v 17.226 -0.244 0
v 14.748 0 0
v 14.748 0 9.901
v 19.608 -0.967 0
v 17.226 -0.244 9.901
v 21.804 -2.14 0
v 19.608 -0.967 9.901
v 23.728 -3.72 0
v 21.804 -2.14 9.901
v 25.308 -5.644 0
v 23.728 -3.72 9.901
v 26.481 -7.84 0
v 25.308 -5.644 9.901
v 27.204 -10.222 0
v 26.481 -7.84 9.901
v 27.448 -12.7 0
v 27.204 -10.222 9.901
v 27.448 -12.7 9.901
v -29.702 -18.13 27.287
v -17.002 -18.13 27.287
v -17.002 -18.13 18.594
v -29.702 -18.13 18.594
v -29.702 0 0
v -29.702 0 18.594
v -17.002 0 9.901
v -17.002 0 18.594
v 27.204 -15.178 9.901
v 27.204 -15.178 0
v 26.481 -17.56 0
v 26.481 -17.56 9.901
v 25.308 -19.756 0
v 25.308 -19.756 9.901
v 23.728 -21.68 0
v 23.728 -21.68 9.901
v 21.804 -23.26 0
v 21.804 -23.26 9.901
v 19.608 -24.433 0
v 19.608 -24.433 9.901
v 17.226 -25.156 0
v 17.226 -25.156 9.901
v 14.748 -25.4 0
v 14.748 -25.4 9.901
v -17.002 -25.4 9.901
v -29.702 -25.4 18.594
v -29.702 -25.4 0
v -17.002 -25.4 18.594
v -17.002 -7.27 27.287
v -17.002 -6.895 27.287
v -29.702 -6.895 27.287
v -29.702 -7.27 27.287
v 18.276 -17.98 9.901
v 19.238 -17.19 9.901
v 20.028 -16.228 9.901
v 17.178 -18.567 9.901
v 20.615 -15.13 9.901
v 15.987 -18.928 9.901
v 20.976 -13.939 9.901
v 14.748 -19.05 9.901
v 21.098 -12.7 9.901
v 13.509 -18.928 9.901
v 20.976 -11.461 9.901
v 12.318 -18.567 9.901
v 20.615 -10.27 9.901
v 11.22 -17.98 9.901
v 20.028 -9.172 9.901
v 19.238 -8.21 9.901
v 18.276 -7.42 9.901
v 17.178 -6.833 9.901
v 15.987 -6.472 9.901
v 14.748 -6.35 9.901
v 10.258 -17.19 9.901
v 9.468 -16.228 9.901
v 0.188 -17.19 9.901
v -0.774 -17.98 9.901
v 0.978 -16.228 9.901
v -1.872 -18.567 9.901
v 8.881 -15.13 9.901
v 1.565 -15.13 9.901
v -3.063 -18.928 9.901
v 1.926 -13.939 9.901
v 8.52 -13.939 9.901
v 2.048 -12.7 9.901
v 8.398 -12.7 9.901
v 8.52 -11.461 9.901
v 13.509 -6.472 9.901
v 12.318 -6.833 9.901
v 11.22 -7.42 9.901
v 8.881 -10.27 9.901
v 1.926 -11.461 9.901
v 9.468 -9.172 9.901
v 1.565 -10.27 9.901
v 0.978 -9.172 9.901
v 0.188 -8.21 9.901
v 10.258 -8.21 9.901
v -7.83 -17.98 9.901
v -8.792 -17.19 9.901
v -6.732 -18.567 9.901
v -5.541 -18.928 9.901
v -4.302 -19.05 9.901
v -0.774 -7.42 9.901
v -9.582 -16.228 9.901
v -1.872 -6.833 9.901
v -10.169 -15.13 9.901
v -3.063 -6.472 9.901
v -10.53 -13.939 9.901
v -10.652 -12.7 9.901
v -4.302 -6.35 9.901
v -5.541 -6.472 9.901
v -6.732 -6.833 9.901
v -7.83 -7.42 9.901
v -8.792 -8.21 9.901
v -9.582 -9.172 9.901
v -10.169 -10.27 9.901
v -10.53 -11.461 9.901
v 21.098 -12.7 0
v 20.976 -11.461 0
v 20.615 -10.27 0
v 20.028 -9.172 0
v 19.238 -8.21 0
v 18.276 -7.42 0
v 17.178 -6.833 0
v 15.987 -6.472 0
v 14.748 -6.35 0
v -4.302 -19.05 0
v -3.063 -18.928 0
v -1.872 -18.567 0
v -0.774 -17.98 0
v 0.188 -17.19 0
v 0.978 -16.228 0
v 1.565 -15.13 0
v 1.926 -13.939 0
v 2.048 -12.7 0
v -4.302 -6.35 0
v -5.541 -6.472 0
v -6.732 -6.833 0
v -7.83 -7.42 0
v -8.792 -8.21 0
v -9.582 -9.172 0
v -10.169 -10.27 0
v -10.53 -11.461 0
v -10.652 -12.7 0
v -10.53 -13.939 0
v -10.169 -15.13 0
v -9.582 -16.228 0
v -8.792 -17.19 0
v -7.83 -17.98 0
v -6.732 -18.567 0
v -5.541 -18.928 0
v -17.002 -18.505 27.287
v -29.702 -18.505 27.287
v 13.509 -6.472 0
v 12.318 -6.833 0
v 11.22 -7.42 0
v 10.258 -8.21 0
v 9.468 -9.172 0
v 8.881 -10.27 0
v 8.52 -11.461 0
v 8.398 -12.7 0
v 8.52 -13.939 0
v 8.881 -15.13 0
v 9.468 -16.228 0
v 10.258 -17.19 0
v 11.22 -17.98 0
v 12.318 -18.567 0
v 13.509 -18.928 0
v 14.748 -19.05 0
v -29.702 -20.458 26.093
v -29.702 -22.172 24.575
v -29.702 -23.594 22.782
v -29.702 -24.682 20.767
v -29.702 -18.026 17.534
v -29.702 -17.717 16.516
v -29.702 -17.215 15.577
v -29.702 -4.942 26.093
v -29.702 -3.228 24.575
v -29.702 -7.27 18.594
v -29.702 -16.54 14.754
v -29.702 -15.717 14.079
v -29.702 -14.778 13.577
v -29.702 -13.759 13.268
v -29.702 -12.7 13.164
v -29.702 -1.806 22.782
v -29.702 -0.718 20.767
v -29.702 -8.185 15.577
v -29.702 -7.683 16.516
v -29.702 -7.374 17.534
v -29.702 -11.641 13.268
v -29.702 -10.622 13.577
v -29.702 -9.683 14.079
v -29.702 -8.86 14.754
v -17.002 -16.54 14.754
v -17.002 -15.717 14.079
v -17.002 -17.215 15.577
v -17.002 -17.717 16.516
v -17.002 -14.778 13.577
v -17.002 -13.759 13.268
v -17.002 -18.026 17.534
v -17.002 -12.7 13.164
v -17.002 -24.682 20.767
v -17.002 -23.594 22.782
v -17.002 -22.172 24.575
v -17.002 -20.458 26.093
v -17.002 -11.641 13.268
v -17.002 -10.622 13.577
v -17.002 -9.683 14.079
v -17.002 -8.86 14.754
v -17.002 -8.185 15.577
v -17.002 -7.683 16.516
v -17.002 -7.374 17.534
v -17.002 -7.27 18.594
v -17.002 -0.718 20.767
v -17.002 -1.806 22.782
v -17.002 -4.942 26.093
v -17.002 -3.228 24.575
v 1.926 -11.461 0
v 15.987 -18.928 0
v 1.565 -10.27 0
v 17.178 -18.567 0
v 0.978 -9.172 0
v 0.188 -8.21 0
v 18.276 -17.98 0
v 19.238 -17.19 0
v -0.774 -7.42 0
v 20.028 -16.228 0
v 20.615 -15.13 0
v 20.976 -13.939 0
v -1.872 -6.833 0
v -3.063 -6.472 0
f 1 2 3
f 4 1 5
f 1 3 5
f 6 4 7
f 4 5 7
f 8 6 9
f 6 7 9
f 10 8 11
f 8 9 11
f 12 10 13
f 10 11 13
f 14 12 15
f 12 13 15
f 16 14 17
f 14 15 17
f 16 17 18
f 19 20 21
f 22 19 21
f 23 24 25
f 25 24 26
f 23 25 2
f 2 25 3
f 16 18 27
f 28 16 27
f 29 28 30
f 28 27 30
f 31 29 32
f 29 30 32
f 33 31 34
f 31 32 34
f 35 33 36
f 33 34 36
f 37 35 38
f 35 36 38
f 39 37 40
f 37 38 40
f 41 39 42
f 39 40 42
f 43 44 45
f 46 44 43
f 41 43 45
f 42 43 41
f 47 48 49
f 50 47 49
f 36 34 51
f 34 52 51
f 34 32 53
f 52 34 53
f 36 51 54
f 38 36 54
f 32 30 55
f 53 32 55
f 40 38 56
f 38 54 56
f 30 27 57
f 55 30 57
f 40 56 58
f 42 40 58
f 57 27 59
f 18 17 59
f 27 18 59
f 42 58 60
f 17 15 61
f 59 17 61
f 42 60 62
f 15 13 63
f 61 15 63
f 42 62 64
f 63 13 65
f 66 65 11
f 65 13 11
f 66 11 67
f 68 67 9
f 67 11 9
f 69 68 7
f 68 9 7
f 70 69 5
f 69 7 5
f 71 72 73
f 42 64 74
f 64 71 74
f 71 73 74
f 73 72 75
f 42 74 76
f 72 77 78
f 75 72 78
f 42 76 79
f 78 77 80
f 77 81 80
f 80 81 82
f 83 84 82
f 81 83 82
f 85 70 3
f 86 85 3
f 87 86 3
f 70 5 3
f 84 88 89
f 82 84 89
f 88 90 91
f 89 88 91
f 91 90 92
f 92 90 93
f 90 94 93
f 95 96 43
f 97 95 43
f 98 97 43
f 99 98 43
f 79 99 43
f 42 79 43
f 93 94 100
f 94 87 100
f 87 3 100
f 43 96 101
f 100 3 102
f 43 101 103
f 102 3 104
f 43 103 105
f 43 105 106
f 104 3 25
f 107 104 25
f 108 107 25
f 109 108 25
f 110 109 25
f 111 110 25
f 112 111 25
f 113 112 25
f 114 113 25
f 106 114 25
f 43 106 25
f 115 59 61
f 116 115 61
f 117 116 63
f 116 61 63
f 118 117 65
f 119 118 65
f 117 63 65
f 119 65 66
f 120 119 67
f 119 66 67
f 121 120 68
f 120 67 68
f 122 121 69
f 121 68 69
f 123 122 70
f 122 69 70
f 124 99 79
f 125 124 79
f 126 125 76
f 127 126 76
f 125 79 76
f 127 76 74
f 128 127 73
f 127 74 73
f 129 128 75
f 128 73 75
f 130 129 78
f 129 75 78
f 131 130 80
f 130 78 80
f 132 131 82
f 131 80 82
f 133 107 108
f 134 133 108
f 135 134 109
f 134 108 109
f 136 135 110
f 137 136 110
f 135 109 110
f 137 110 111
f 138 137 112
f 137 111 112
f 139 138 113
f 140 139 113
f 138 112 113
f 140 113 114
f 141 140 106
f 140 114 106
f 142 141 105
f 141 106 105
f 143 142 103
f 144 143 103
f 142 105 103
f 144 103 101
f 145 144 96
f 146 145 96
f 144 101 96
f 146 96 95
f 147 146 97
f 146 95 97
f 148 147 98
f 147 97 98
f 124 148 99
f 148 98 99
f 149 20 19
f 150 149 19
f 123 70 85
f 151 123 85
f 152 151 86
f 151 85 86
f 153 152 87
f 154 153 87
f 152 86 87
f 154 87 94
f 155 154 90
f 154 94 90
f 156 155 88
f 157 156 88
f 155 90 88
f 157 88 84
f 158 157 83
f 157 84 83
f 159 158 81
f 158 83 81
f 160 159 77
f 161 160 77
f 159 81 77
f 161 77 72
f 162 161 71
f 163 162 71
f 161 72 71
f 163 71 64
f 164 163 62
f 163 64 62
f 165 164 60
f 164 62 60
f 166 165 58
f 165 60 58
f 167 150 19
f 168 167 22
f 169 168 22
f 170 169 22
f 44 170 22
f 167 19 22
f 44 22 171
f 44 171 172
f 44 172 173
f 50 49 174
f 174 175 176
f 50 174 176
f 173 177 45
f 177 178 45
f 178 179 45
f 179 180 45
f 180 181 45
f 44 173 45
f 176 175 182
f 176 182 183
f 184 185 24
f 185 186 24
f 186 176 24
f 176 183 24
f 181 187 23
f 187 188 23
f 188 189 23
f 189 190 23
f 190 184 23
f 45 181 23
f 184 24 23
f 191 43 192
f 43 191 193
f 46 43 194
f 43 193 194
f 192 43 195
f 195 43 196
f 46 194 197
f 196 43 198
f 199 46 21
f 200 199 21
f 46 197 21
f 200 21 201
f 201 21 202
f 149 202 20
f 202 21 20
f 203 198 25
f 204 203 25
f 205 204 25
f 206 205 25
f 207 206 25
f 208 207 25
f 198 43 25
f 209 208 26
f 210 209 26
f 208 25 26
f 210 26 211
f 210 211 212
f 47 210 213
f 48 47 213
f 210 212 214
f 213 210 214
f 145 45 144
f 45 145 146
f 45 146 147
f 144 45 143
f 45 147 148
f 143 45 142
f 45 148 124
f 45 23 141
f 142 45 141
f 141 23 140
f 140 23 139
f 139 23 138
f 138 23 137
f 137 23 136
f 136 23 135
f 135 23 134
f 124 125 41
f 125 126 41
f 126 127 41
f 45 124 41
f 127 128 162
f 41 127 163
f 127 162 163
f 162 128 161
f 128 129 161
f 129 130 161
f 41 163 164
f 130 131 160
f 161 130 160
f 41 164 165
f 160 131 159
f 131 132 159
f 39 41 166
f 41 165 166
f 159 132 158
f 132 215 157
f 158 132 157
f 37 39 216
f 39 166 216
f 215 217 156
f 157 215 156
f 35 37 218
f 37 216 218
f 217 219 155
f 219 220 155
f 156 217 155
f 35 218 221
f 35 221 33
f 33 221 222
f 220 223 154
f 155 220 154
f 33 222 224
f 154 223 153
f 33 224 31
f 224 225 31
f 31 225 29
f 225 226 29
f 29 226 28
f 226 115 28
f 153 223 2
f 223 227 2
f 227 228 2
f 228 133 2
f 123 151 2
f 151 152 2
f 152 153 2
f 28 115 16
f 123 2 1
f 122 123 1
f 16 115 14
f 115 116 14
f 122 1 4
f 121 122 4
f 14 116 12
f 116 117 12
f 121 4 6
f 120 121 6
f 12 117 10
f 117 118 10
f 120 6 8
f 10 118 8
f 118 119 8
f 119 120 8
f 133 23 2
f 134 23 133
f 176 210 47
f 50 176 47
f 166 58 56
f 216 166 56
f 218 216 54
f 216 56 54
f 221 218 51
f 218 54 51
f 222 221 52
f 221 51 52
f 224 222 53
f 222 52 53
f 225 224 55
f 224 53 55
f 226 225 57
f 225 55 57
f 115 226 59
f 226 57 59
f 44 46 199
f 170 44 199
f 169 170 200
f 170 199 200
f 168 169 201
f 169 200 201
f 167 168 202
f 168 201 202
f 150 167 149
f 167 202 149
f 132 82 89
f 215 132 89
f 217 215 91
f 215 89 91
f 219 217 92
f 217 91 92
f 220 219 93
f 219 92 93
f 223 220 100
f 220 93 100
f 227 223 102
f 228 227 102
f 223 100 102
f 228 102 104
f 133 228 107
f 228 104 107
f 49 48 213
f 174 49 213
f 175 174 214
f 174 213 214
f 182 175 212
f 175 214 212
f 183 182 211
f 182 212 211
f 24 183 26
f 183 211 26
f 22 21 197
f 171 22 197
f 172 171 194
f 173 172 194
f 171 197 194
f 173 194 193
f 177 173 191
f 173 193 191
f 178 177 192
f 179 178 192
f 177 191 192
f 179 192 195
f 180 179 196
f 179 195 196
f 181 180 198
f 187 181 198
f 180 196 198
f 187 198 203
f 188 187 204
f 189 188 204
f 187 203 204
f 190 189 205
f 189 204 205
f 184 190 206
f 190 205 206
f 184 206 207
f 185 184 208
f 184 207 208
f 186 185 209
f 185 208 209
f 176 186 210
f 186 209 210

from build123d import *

# Parameters (mm, degrees)
F1_DEPTH = 25.4
F3_DEPTH = 12.701
F5_DEPTH = 9.9016336957


with BuildPart() as f1:
    # F0 (on Front) → F1 (new body)
    with BuildSketch(Plane.XZ):
        Polygon((-29.7019003412, 0), (27.4480996588, 0), (27.4480996588, 9.9006336957), (-17.0019003412, 9.9006336957), (-17.0019003412, 27.2871126172), (-29.7019003412, 27.2871126172), align=None)
    extrude(amount=F1_DEPTH)

    # F2 (on face) → F3 (cut, through all)
    with BuildSketch(Plane.YZ.offset(-17.0019003412)):
        with BuildLine():
            Line((-25.4, 27.2871126172), (-25.4, 18.5938731565))
            ThreePointArc((-25.4, 18.5938731565), (-22.9225497247, 23.7099564427), (-18.5048555567, 27.2871126172))
            Line((-18.5048555567, 27.2871126172), (-25.4, 27.2871126172))
        make_face()
        with BuildLine():
            ThreePointArc((-7.2696510886, 18.5938731565), (-12.7, 24.0242220678), (-18.1303489114, 18.5938731565))
            Line((-18.1303489114, 18.5938731565), (-7.2696510886, 18.5938731565))
        make_face()
        with BuildLine():
            Line((-18.1303489114, 27.2871126172), (-18.1303489114, 18.5938731565))
            ThreePointArc((-18.1303489114, 18.5938731565), (-12.7, 24.0242220678), (-7.2696510886, 18.5938731565))
            Line((-7.2696510886, 18.5938731565), (-7.2696510886, 27.2871126172))
            Line((-7.2696510886, 27.2871126172), (-18.1303489114, 27.2871126172))
        make_face()
        with BuildLine():
            Line((-7.2696510886, 18.5938731565), (-18.1303489114, 18.5938731565))
            ThreePointArc((-18.1303489114, 18.5938731565), (-12.7, 13.1635242451), (-7.2696510886, 18.5938731565))
        make_face()
        with BuildLine():
            ThreePointArc((-6.8951444433, 27.2871126172), (-12.7, 28.6495177359), (-18.5048555567, 27.2871126172))
            Line((-18.5048555567, 27.2871126172), (-18.1303489114, 27.2871126172))
            Line((-18.1303489114, 27.2871126172), (-7.2696510886, 27.2871126172))
            Line((-7.2696510886, 27.2871126172), (-6.8951444433, 27.2871126172))
        make_face()
        with BuildLine():
            Line((0, 27.2871126172), (-6.8951444433, 27.2871126172))
            ThreePointArc((-6.8951444433, 27.2871126172), (-2.4774502753, 23.7099564427), (0, 18.5938731565))
            Line((0, 18.5938731565), (0, 27.2871126172))
        make_face()
    extrude(amount=-F3_DEPTH, mode=Mode.SUBTRACT)

    # F4 (on face) → F5 (cut, through all)
    with BuildSketch(Plane.XY.offset(9.9006336957)):
        with BuildLine():
            Line((14.7480996588, -19.05), (14.7480996588, -6.35))
            ThreePointArc((14.7480996588, -6.35), (8.3980996588, -12.7), (14.7480996588, -19.05))
        make_face()
        with BuildLine():
            ThreePointArc((21.0980996588, -12.7), (19.2382277193, -8.2098719395), (14.7480996588, -6.35))
            Line((14.7480996588, -6.35), (14.7480996588, -19.05))
            ThreePointArc((14.7480996588, -19.05), (19.2382277193, -17.1901280605), (21.0980996588, -12.7))
        make_face()
        with BuildLine():
            Line((-4.3019003412, -19.05), (-4.3019003412, -6.35))
            ThreePointArc((-4.3019003412, -6.35), (-10.6519003412, -12.7), (-4.3019003412, -19.05))
        make_face()
        with BuildLine():
            ThreePointArc((2.0480996588, -12.7), (0.1882277193, -8.2098719395), (-4.3019003412, -6.35))
            Line((-4.3019003412, -6.35), (-4.3019003412, -19.05))
            ThreePointArc((-4.3019003412, -19.05), (0.1882277193, -17.1901280605), (2.0480996588, -12.7))
        make_face()
        with BuildLine():
            Line((27.4480996588, 0), (14.7480996588, 0))
            ThreePointArc((14.7480996588, 0), (23.7283557799, -3.7197438789), (27.4480996588, -12.7))
            Line((27.4480996588, -12.7), (27.4480996588, 0))
        make_face()
        with BuildLine():
            Line((27.4480996588, -25.4), (27.4480996588, -12.7))
            ThreePointArc((27.4480996588, -12.7), (23.7283557799, -21.6802561211), (14.7480996588, -25.4))
            Line((14.7480996588, -25.4), (27.4480996588, -25.4))
        make_face()
    extrude(amount=-F5_DEPTH, mode=Mode.SUBTRACT)


solid = f1.part
